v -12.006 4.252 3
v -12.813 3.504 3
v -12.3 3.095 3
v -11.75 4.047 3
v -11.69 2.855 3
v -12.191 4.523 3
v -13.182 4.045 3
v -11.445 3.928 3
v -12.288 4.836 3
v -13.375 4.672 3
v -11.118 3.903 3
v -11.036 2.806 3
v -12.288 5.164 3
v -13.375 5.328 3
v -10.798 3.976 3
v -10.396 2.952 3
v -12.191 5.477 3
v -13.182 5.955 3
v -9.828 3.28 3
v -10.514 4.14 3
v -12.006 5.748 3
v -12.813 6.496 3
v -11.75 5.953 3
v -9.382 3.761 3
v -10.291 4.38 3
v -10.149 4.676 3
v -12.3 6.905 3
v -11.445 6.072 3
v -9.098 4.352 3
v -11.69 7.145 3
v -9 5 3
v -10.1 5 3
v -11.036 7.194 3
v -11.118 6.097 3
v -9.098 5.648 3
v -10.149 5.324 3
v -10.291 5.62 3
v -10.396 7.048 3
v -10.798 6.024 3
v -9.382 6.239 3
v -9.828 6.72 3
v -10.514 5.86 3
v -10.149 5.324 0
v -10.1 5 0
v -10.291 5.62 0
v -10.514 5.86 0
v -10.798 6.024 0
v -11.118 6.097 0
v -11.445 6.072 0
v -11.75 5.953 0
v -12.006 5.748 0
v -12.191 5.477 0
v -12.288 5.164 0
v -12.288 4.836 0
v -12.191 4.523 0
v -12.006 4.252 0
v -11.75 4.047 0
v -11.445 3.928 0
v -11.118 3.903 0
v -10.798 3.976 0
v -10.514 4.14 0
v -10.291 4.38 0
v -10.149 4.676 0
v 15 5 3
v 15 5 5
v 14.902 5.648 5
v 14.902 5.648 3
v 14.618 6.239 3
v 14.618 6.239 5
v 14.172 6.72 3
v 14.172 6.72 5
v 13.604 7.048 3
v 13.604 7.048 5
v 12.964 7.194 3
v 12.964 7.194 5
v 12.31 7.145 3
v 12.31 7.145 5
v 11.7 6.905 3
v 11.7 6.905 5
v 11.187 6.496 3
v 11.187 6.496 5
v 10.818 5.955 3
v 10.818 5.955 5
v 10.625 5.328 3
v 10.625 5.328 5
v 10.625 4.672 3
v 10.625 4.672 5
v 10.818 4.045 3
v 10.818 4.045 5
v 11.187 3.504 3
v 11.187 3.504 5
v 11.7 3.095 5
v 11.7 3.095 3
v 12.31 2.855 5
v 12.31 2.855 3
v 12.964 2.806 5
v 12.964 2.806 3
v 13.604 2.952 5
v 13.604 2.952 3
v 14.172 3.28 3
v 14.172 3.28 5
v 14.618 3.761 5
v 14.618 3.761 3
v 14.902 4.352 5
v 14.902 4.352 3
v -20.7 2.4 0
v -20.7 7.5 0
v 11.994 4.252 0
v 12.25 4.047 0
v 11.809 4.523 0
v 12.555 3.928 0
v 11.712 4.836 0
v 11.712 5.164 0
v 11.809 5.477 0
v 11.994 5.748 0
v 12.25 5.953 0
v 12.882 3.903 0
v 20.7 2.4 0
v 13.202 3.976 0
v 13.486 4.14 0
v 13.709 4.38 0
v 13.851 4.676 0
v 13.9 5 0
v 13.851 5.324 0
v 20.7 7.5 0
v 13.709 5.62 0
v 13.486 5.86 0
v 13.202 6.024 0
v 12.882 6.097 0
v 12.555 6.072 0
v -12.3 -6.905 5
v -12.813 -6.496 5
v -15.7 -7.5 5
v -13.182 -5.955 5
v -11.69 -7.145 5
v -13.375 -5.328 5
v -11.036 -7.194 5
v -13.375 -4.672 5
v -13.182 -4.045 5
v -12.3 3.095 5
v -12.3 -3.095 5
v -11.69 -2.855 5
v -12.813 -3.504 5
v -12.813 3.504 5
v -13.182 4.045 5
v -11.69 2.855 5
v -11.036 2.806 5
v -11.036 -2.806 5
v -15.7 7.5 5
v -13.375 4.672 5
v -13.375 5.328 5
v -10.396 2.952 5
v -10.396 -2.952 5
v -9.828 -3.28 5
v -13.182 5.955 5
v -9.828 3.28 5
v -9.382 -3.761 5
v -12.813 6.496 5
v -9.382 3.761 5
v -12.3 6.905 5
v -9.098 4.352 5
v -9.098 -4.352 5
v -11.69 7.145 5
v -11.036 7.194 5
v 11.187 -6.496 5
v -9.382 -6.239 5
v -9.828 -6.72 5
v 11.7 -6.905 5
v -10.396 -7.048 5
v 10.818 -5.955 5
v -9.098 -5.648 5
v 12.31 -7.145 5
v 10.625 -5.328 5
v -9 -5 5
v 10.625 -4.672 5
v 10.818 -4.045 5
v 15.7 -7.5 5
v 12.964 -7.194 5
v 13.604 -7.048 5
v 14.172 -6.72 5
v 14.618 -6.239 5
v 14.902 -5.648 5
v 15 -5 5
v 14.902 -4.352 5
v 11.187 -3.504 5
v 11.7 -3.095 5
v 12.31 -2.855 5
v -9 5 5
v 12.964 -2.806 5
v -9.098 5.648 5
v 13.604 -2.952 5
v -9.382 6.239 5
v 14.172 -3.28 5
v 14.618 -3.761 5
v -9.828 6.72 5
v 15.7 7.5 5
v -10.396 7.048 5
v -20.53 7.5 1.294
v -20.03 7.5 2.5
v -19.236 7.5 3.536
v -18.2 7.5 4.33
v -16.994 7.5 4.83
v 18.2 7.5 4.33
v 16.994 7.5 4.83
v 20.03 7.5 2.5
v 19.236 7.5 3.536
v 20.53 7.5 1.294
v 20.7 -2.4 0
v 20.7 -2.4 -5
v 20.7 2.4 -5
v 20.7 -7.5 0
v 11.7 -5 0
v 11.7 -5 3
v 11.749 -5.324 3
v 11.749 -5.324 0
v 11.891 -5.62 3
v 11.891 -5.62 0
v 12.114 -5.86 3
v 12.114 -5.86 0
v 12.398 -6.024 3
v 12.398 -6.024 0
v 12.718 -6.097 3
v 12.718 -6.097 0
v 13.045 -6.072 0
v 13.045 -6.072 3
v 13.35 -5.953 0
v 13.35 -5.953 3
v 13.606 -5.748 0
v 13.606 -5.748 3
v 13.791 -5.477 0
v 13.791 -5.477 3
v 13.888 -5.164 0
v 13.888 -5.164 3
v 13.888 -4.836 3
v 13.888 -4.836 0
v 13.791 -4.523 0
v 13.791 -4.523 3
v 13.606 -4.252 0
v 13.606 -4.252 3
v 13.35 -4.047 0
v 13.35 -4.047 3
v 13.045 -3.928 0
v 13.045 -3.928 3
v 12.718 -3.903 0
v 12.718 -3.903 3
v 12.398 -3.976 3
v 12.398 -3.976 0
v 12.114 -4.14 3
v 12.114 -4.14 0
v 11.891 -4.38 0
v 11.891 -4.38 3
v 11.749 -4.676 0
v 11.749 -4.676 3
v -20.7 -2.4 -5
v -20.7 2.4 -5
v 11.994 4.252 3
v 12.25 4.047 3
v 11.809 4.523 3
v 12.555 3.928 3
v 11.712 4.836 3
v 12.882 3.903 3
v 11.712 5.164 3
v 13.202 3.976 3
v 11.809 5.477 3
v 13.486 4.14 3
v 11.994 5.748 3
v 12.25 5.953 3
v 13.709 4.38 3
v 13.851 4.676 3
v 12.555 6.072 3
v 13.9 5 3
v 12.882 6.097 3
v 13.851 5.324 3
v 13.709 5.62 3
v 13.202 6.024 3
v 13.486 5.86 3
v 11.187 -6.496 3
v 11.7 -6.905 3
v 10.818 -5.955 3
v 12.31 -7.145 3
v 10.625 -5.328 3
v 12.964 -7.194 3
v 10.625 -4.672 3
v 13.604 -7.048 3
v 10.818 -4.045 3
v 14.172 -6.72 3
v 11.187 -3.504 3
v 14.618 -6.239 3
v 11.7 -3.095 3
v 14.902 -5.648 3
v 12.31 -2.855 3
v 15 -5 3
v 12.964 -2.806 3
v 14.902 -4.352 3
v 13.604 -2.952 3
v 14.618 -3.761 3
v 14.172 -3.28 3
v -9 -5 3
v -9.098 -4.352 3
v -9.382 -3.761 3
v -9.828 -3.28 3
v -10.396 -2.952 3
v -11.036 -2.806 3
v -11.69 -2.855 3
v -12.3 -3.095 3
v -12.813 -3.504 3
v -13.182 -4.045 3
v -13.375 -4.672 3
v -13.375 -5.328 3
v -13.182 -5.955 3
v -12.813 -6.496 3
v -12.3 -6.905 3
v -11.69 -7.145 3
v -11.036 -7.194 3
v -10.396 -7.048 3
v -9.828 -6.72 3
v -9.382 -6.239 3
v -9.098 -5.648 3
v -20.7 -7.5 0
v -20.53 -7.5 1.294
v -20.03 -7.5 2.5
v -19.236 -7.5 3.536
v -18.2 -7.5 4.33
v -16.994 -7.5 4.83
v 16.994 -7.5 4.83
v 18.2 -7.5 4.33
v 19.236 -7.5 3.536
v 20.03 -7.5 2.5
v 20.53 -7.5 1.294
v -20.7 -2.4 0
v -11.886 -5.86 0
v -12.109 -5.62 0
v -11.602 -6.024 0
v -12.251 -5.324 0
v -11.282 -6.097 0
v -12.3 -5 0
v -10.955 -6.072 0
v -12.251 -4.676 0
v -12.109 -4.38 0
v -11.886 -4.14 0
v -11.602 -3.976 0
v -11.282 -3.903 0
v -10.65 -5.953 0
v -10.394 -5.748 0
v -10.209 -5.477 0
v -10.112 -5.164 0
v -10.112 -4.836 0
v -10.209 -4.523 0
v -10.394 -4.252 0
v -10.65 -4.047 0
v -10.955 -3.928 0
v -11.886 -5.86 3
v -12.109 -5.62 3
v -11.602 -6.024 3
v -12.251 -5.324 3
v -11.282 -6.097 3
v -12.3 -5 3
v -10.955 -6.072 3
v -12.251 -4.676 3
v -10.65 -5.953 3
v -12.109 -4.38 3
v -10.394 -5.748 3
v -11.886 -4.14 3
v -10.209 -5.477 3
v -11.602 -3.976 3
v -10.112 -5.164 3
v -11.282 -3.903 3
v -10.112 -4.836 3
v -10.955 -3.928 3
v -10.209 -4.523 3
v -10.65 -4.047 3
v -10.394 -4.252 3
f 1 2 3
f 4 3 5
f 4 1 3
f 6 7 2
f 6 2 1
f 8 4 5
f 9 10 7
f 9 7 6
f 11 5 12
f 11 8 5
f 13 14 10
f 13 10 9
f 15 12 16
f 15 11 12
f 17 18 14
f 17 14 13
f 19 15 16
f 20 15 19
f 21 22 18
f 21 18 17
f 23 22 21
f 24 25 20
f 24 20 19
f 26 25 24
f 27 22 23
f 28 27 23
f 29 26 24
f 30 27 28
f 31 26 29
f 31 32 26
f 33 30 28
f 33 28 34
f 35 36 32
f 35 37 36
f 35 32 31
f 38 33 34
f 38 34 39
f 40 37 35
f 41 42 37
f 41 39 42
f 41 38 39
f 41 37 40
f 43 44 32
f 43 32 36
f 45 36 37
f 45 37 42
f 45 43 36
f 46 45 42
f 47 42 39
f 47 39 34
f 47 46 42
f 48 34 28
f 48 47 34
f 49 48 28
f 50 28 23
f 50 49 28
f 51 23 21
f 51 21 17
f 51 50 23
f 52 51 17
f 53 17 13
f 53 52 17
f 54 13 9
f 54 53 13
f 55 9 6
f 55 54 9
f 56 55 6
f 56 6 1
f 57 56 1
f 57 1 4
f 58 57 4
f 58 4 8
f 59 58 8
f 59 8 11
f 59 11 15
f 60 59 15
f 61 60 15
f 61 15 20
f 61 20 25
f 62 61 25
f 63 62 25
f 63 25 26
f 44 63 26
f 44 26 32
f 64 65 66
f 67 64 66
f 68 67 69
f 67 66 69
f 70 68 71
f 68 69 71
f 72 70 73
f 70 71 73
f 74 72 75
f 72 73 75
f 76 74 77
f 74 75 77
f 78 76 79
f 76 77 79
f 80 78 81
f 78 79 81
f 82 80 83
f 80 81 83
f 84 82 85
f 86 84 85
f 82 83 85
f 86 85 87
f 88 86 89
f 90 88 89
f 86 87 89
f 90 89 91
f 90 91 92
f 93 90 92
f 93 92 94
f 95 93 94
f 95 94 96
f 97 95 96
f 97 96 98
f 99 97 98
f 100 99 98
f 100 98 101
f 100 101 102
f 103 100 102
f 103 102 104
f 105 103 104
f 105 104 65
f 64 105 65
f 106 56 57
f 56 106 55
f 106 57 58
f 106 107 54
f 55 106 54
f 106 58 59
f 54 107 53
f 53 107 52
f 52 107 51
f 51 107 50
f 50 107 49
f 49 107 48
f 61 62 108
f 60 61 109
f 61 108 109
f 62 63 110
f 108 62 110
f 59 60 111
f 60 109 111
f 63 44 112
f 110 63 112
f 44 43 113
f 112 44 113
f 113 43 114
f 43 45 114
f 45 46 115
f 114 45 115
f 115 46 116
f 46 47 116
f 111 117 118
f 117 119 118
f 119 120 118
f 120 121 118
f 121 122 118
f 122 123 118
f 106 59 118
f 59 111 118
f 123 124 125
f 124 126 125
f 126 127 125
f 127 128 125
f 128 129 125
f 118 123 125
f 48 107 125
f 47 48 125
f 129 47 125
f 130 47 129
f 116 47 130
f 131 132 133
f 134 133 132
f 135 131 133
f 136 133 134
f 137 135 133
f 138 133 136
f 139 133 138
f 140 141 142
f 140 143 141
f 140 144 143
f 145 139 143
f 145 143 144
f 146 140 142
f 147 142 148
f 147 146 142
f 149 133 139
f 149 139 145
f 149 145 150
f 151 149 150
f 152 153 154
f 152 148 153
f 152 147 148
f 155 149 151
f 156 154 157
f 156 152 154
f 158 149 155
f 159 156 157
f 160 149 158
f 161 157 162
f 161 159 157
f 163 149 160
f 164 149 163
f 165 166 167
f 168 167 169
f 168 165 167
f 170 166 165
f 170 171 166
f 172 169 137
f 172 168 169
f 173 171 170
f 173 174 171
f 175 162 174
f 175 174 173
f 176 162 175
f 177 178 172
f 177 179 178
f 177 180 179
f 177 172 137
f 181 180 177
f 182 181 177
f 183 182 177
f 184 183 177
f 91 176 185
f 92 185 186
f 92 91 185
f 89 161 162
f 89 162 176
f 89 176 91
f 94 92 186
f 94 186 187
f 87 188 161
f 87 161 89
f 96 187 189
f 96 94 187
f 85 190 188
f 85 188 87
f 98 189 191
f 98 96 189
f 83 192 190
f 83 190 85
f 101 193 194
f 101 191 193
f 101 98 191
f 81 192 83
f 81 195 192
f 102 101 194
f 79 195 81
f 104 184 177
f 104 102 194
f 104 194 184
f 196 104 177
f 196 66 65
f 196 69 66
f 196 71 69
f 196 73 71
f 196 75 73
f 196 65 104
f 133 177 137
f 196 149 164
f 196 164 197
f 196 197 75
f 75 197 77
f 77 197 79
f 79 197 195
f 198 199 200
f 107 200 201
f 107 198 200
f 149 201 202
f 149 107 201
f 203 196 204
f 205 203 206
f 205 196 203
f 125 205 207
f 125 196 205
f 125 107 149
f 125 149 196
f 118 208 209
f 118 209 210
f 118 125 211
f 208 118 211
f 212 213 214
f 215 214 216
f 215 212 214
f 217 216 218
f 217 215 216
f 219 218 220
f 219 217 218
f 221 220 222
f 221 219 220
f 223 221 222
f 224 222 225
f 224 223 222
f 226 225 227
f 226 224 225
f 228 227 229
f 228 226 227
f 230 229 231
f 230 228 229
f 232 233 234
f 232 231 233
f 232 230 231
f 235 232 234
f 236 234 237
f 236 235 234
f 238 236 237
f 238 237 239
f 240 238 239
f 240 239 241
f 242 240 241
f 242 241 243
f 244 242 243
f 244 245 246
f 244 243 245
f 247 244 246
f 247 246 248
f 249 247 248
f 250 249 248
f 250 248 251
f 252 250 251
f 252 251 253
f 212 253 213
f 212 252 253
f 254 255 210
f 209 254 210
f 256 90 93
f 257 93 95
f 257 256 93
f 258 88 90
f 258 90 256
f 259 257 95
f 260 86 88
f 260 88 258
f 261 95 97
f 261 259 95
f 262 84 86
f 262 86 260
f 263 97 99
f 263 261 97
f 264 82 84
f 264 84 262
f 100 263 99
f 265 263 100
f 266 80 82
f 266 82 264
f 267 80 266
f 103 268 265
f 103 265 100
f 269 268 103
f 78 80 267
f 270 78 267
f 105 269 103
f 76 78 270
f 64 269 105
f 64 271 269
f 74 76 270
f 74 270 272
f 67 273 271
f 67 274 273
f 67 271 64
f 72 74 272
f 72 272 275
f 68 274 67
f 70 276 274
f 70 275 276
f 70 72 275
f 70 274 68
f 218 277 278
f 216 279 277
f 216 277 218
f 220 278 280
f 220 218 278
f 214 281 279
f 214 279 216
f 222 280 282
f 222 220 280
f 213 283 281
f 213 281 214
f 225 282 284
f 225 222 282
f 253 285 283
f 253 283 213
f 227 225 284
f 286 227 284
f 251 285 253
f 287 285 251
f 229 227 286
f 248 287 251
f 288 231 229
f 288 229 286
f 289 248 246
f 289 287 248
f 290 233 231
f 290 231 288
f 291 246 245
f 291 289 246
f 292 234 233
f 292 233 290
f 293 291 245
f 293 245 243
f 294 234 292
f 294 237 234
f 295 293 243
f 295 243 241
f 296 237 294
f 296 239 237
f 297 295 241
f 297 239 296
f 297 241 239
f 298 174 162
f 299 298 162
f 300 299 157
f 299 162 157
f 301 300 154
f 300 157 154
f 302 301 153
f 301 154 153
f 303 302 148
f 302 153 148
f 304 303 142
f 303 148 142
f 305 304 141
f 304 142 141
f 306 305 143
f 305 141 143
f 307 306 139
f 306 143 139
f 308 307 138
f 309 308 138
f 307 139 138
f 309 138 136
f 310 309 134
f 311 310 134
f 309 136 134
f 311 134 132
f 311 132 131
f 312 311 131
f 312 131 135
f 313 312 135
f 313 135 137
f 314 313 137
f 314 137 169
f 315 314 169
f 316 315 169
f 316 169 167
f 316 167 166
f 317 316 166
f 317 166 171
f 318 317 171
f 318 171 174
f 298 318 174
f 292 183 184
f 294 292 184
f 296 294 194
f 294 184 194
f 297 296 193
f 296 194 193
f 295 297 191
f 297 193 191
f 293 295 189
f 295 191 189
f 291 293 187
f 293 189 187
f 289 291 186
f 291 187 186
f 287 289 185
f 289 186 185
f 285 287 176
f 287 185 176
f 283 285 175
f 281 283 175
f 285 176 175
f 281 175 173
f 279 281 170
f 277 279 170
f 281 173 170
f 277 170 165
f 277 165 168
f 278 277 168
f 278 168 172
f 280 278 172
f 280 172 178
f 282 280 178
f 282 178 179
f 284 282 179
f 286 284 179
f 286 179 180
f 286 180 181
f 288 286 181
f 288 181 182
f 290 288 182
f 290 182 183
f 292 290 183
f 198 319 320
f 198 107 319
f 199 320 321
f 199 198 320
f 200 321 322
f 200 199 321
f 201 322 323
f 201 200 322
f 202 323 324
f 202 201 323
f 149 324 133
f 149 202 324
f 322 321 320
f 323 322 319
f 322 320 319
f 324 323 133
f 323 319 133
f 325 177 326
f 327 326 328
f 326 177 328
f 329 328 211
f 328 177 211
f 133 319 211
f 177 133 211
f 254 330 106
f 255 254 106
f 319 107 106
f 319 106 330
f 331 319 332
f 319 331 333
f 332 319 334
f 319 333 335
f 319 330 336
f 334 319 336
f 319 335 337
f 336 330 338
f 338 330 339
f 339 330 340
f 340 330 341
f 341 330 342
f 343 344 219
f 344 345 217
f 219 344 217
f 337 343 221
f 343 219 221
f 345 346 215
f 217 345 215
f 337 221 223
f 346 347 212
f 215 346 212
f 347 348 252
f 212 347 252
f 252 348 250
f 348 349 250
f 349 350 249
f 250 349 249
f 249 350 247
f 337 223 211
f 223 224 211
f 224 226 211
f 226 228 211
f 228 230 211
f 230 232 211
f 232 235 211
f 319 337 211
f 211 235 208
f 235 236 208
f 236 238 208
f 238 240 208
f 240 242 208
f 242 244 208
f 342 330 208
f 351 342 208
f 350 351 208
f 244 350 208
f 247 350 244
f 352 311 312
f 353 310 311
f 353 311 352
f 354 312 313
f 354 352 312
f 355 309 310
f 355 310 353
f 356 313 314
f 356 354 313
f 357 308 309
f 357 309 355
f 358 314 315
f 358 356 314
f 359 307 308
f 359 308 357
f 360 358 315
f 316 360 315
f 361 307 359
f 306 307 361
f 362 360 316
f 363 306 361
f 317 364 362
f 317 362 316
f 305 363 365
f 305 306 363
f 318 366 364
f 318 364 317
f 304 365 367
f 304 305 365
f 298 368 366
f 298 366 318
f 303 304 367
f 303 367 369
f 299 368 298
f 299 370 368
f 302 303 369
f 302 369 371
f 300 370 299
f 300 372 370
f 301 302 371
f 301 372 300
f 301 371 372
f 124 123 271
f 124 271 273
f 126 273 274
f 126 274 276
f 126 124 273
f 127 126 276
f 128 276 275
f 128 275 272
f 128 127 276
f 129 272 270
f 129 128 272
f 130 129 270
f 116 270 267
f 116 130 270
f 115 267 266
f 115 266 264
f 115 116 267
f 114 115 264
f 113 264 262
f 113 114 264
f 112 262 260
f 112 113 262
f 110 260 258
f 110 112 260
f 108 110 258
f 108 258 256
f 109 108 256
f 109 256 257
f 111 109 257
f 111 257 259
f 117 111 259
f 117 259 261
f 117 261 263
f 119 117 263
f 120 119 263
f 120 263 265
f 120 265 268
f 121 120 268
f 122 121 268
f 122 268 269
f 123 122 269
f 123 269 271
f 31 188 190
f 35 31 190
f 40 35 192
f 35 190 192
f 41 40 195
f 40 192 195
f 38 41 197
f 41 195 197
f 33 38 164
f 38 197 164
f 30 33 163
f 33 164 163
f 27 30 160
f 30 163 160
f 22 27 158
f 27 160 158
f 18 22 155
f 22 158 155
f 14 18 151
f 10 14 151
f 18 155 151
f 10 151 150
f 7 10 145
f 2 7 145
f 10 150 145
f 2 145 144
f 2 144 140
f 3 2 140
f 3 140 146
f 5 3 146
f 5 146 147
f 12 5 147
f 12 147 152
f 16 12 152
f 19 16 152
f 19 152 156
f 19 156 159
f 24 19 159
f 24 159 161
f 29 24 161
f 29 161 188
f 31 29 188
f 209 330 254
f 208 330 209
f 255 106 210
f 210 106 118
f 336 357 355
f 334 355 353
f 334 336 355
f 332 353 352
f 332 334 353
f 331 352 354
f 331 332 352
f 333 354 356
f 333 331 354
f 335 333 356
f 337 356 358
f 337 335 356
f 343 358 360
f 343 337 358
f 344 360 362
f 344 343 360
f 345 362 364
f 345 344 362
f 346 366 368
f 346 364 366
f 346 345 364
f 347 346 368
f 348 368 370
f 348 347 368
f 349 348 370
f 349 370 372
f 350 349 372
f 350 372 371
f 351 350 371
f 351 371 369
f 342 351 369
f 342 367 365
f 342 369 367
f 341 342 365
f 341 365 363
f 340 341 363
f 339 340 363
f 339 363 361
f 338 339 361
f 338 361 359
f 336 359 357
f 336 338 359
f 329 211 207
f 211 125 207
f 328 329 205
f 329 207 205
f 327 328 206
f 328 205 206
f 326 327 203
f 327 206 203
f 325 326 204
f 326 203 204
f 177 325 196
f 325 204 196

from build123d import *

# Parameters (mm, degrees)
SKETCH1_W                      = 41.4
SKETCH1_H                      = 15
SKETCH1_R                      = 1.1
BOSS_EXTRUDE1_DEPTH            = 5
SKETCH2_W                      = 41.4
SKETCH2_H                      = 4.8
BOSS_EXTRUDE2_DEPTH            = 5
CBORE_FOR_M2_SHCS1_D           = 2.2
CBORE_FOR_M2_SHCS1_CBORE_D     = 4.4
CBORE_FOR_M2_SHCS1_CBORE_DEPTH = 2
FILLET1_R                      = 5


with BuildPart() as part:
    # Sketch1 → Boss-Extrude1 (new body)
    with BuildSketch(Plane.XY):
        Rectangle(SKETCH1_W, SKETCH1_H)
        with Locations((-11.2, 5)):
            Circle(SKETCH1_R, mode=Mode.SUBTRACT)
        with Locations((12.8, 5)):
            Circle(SKETCH1_R, mode=Mode.SUBTRACT)
        with Locations(Location((12.8, -5, 0), (0, 0, 180))):
            Circle(SKETCH1_R, mode=Mode.SUBTRACT)
        with Locations(Location((-11.2, -5, 0), (0, 0, 180))):
            Circle(SKETCH1_R, mode=Mode.SUBTRACT)
    extrude(amount=BOSS_EXTRUDE1_DEPTH)

    # Sketch2 → Boss-Extrude2 (add)
    with BuildSketch(Plane.XY):
        Rectangle(SKETCH2_W, SKETCH2_H)
    extrude(amount=-BOSS_EXTRUDE2_DEPTH)

    # CBORE for M2 SHCS1 (through all)
    with Locations(Plane.XY.offset(5)):
        with Locations((-11.2, 5), (12.8, 5), (12.8, -5), (-11.2, -5)):
            CounterBoreHole(CBORE_FOR_M2_SHCS1_D / 2, CBORE_FOR_M2_SHCS1_CBORE_D / 2, CBORE_FOR_M2_SHCS1_CBORE_DEPTH)

    # Fillet1
    fillet1_edges = [part.edges().sort_by_distance(p)[0] for p in [
        (-20.7, 0, 5),
        (20.7, 0, 5),
    ]]
    fillet(fillet1_edges, radius=FILLET1_R - 0.0001)  # a hair under: the kernel refuses the full size


solid = part.part
